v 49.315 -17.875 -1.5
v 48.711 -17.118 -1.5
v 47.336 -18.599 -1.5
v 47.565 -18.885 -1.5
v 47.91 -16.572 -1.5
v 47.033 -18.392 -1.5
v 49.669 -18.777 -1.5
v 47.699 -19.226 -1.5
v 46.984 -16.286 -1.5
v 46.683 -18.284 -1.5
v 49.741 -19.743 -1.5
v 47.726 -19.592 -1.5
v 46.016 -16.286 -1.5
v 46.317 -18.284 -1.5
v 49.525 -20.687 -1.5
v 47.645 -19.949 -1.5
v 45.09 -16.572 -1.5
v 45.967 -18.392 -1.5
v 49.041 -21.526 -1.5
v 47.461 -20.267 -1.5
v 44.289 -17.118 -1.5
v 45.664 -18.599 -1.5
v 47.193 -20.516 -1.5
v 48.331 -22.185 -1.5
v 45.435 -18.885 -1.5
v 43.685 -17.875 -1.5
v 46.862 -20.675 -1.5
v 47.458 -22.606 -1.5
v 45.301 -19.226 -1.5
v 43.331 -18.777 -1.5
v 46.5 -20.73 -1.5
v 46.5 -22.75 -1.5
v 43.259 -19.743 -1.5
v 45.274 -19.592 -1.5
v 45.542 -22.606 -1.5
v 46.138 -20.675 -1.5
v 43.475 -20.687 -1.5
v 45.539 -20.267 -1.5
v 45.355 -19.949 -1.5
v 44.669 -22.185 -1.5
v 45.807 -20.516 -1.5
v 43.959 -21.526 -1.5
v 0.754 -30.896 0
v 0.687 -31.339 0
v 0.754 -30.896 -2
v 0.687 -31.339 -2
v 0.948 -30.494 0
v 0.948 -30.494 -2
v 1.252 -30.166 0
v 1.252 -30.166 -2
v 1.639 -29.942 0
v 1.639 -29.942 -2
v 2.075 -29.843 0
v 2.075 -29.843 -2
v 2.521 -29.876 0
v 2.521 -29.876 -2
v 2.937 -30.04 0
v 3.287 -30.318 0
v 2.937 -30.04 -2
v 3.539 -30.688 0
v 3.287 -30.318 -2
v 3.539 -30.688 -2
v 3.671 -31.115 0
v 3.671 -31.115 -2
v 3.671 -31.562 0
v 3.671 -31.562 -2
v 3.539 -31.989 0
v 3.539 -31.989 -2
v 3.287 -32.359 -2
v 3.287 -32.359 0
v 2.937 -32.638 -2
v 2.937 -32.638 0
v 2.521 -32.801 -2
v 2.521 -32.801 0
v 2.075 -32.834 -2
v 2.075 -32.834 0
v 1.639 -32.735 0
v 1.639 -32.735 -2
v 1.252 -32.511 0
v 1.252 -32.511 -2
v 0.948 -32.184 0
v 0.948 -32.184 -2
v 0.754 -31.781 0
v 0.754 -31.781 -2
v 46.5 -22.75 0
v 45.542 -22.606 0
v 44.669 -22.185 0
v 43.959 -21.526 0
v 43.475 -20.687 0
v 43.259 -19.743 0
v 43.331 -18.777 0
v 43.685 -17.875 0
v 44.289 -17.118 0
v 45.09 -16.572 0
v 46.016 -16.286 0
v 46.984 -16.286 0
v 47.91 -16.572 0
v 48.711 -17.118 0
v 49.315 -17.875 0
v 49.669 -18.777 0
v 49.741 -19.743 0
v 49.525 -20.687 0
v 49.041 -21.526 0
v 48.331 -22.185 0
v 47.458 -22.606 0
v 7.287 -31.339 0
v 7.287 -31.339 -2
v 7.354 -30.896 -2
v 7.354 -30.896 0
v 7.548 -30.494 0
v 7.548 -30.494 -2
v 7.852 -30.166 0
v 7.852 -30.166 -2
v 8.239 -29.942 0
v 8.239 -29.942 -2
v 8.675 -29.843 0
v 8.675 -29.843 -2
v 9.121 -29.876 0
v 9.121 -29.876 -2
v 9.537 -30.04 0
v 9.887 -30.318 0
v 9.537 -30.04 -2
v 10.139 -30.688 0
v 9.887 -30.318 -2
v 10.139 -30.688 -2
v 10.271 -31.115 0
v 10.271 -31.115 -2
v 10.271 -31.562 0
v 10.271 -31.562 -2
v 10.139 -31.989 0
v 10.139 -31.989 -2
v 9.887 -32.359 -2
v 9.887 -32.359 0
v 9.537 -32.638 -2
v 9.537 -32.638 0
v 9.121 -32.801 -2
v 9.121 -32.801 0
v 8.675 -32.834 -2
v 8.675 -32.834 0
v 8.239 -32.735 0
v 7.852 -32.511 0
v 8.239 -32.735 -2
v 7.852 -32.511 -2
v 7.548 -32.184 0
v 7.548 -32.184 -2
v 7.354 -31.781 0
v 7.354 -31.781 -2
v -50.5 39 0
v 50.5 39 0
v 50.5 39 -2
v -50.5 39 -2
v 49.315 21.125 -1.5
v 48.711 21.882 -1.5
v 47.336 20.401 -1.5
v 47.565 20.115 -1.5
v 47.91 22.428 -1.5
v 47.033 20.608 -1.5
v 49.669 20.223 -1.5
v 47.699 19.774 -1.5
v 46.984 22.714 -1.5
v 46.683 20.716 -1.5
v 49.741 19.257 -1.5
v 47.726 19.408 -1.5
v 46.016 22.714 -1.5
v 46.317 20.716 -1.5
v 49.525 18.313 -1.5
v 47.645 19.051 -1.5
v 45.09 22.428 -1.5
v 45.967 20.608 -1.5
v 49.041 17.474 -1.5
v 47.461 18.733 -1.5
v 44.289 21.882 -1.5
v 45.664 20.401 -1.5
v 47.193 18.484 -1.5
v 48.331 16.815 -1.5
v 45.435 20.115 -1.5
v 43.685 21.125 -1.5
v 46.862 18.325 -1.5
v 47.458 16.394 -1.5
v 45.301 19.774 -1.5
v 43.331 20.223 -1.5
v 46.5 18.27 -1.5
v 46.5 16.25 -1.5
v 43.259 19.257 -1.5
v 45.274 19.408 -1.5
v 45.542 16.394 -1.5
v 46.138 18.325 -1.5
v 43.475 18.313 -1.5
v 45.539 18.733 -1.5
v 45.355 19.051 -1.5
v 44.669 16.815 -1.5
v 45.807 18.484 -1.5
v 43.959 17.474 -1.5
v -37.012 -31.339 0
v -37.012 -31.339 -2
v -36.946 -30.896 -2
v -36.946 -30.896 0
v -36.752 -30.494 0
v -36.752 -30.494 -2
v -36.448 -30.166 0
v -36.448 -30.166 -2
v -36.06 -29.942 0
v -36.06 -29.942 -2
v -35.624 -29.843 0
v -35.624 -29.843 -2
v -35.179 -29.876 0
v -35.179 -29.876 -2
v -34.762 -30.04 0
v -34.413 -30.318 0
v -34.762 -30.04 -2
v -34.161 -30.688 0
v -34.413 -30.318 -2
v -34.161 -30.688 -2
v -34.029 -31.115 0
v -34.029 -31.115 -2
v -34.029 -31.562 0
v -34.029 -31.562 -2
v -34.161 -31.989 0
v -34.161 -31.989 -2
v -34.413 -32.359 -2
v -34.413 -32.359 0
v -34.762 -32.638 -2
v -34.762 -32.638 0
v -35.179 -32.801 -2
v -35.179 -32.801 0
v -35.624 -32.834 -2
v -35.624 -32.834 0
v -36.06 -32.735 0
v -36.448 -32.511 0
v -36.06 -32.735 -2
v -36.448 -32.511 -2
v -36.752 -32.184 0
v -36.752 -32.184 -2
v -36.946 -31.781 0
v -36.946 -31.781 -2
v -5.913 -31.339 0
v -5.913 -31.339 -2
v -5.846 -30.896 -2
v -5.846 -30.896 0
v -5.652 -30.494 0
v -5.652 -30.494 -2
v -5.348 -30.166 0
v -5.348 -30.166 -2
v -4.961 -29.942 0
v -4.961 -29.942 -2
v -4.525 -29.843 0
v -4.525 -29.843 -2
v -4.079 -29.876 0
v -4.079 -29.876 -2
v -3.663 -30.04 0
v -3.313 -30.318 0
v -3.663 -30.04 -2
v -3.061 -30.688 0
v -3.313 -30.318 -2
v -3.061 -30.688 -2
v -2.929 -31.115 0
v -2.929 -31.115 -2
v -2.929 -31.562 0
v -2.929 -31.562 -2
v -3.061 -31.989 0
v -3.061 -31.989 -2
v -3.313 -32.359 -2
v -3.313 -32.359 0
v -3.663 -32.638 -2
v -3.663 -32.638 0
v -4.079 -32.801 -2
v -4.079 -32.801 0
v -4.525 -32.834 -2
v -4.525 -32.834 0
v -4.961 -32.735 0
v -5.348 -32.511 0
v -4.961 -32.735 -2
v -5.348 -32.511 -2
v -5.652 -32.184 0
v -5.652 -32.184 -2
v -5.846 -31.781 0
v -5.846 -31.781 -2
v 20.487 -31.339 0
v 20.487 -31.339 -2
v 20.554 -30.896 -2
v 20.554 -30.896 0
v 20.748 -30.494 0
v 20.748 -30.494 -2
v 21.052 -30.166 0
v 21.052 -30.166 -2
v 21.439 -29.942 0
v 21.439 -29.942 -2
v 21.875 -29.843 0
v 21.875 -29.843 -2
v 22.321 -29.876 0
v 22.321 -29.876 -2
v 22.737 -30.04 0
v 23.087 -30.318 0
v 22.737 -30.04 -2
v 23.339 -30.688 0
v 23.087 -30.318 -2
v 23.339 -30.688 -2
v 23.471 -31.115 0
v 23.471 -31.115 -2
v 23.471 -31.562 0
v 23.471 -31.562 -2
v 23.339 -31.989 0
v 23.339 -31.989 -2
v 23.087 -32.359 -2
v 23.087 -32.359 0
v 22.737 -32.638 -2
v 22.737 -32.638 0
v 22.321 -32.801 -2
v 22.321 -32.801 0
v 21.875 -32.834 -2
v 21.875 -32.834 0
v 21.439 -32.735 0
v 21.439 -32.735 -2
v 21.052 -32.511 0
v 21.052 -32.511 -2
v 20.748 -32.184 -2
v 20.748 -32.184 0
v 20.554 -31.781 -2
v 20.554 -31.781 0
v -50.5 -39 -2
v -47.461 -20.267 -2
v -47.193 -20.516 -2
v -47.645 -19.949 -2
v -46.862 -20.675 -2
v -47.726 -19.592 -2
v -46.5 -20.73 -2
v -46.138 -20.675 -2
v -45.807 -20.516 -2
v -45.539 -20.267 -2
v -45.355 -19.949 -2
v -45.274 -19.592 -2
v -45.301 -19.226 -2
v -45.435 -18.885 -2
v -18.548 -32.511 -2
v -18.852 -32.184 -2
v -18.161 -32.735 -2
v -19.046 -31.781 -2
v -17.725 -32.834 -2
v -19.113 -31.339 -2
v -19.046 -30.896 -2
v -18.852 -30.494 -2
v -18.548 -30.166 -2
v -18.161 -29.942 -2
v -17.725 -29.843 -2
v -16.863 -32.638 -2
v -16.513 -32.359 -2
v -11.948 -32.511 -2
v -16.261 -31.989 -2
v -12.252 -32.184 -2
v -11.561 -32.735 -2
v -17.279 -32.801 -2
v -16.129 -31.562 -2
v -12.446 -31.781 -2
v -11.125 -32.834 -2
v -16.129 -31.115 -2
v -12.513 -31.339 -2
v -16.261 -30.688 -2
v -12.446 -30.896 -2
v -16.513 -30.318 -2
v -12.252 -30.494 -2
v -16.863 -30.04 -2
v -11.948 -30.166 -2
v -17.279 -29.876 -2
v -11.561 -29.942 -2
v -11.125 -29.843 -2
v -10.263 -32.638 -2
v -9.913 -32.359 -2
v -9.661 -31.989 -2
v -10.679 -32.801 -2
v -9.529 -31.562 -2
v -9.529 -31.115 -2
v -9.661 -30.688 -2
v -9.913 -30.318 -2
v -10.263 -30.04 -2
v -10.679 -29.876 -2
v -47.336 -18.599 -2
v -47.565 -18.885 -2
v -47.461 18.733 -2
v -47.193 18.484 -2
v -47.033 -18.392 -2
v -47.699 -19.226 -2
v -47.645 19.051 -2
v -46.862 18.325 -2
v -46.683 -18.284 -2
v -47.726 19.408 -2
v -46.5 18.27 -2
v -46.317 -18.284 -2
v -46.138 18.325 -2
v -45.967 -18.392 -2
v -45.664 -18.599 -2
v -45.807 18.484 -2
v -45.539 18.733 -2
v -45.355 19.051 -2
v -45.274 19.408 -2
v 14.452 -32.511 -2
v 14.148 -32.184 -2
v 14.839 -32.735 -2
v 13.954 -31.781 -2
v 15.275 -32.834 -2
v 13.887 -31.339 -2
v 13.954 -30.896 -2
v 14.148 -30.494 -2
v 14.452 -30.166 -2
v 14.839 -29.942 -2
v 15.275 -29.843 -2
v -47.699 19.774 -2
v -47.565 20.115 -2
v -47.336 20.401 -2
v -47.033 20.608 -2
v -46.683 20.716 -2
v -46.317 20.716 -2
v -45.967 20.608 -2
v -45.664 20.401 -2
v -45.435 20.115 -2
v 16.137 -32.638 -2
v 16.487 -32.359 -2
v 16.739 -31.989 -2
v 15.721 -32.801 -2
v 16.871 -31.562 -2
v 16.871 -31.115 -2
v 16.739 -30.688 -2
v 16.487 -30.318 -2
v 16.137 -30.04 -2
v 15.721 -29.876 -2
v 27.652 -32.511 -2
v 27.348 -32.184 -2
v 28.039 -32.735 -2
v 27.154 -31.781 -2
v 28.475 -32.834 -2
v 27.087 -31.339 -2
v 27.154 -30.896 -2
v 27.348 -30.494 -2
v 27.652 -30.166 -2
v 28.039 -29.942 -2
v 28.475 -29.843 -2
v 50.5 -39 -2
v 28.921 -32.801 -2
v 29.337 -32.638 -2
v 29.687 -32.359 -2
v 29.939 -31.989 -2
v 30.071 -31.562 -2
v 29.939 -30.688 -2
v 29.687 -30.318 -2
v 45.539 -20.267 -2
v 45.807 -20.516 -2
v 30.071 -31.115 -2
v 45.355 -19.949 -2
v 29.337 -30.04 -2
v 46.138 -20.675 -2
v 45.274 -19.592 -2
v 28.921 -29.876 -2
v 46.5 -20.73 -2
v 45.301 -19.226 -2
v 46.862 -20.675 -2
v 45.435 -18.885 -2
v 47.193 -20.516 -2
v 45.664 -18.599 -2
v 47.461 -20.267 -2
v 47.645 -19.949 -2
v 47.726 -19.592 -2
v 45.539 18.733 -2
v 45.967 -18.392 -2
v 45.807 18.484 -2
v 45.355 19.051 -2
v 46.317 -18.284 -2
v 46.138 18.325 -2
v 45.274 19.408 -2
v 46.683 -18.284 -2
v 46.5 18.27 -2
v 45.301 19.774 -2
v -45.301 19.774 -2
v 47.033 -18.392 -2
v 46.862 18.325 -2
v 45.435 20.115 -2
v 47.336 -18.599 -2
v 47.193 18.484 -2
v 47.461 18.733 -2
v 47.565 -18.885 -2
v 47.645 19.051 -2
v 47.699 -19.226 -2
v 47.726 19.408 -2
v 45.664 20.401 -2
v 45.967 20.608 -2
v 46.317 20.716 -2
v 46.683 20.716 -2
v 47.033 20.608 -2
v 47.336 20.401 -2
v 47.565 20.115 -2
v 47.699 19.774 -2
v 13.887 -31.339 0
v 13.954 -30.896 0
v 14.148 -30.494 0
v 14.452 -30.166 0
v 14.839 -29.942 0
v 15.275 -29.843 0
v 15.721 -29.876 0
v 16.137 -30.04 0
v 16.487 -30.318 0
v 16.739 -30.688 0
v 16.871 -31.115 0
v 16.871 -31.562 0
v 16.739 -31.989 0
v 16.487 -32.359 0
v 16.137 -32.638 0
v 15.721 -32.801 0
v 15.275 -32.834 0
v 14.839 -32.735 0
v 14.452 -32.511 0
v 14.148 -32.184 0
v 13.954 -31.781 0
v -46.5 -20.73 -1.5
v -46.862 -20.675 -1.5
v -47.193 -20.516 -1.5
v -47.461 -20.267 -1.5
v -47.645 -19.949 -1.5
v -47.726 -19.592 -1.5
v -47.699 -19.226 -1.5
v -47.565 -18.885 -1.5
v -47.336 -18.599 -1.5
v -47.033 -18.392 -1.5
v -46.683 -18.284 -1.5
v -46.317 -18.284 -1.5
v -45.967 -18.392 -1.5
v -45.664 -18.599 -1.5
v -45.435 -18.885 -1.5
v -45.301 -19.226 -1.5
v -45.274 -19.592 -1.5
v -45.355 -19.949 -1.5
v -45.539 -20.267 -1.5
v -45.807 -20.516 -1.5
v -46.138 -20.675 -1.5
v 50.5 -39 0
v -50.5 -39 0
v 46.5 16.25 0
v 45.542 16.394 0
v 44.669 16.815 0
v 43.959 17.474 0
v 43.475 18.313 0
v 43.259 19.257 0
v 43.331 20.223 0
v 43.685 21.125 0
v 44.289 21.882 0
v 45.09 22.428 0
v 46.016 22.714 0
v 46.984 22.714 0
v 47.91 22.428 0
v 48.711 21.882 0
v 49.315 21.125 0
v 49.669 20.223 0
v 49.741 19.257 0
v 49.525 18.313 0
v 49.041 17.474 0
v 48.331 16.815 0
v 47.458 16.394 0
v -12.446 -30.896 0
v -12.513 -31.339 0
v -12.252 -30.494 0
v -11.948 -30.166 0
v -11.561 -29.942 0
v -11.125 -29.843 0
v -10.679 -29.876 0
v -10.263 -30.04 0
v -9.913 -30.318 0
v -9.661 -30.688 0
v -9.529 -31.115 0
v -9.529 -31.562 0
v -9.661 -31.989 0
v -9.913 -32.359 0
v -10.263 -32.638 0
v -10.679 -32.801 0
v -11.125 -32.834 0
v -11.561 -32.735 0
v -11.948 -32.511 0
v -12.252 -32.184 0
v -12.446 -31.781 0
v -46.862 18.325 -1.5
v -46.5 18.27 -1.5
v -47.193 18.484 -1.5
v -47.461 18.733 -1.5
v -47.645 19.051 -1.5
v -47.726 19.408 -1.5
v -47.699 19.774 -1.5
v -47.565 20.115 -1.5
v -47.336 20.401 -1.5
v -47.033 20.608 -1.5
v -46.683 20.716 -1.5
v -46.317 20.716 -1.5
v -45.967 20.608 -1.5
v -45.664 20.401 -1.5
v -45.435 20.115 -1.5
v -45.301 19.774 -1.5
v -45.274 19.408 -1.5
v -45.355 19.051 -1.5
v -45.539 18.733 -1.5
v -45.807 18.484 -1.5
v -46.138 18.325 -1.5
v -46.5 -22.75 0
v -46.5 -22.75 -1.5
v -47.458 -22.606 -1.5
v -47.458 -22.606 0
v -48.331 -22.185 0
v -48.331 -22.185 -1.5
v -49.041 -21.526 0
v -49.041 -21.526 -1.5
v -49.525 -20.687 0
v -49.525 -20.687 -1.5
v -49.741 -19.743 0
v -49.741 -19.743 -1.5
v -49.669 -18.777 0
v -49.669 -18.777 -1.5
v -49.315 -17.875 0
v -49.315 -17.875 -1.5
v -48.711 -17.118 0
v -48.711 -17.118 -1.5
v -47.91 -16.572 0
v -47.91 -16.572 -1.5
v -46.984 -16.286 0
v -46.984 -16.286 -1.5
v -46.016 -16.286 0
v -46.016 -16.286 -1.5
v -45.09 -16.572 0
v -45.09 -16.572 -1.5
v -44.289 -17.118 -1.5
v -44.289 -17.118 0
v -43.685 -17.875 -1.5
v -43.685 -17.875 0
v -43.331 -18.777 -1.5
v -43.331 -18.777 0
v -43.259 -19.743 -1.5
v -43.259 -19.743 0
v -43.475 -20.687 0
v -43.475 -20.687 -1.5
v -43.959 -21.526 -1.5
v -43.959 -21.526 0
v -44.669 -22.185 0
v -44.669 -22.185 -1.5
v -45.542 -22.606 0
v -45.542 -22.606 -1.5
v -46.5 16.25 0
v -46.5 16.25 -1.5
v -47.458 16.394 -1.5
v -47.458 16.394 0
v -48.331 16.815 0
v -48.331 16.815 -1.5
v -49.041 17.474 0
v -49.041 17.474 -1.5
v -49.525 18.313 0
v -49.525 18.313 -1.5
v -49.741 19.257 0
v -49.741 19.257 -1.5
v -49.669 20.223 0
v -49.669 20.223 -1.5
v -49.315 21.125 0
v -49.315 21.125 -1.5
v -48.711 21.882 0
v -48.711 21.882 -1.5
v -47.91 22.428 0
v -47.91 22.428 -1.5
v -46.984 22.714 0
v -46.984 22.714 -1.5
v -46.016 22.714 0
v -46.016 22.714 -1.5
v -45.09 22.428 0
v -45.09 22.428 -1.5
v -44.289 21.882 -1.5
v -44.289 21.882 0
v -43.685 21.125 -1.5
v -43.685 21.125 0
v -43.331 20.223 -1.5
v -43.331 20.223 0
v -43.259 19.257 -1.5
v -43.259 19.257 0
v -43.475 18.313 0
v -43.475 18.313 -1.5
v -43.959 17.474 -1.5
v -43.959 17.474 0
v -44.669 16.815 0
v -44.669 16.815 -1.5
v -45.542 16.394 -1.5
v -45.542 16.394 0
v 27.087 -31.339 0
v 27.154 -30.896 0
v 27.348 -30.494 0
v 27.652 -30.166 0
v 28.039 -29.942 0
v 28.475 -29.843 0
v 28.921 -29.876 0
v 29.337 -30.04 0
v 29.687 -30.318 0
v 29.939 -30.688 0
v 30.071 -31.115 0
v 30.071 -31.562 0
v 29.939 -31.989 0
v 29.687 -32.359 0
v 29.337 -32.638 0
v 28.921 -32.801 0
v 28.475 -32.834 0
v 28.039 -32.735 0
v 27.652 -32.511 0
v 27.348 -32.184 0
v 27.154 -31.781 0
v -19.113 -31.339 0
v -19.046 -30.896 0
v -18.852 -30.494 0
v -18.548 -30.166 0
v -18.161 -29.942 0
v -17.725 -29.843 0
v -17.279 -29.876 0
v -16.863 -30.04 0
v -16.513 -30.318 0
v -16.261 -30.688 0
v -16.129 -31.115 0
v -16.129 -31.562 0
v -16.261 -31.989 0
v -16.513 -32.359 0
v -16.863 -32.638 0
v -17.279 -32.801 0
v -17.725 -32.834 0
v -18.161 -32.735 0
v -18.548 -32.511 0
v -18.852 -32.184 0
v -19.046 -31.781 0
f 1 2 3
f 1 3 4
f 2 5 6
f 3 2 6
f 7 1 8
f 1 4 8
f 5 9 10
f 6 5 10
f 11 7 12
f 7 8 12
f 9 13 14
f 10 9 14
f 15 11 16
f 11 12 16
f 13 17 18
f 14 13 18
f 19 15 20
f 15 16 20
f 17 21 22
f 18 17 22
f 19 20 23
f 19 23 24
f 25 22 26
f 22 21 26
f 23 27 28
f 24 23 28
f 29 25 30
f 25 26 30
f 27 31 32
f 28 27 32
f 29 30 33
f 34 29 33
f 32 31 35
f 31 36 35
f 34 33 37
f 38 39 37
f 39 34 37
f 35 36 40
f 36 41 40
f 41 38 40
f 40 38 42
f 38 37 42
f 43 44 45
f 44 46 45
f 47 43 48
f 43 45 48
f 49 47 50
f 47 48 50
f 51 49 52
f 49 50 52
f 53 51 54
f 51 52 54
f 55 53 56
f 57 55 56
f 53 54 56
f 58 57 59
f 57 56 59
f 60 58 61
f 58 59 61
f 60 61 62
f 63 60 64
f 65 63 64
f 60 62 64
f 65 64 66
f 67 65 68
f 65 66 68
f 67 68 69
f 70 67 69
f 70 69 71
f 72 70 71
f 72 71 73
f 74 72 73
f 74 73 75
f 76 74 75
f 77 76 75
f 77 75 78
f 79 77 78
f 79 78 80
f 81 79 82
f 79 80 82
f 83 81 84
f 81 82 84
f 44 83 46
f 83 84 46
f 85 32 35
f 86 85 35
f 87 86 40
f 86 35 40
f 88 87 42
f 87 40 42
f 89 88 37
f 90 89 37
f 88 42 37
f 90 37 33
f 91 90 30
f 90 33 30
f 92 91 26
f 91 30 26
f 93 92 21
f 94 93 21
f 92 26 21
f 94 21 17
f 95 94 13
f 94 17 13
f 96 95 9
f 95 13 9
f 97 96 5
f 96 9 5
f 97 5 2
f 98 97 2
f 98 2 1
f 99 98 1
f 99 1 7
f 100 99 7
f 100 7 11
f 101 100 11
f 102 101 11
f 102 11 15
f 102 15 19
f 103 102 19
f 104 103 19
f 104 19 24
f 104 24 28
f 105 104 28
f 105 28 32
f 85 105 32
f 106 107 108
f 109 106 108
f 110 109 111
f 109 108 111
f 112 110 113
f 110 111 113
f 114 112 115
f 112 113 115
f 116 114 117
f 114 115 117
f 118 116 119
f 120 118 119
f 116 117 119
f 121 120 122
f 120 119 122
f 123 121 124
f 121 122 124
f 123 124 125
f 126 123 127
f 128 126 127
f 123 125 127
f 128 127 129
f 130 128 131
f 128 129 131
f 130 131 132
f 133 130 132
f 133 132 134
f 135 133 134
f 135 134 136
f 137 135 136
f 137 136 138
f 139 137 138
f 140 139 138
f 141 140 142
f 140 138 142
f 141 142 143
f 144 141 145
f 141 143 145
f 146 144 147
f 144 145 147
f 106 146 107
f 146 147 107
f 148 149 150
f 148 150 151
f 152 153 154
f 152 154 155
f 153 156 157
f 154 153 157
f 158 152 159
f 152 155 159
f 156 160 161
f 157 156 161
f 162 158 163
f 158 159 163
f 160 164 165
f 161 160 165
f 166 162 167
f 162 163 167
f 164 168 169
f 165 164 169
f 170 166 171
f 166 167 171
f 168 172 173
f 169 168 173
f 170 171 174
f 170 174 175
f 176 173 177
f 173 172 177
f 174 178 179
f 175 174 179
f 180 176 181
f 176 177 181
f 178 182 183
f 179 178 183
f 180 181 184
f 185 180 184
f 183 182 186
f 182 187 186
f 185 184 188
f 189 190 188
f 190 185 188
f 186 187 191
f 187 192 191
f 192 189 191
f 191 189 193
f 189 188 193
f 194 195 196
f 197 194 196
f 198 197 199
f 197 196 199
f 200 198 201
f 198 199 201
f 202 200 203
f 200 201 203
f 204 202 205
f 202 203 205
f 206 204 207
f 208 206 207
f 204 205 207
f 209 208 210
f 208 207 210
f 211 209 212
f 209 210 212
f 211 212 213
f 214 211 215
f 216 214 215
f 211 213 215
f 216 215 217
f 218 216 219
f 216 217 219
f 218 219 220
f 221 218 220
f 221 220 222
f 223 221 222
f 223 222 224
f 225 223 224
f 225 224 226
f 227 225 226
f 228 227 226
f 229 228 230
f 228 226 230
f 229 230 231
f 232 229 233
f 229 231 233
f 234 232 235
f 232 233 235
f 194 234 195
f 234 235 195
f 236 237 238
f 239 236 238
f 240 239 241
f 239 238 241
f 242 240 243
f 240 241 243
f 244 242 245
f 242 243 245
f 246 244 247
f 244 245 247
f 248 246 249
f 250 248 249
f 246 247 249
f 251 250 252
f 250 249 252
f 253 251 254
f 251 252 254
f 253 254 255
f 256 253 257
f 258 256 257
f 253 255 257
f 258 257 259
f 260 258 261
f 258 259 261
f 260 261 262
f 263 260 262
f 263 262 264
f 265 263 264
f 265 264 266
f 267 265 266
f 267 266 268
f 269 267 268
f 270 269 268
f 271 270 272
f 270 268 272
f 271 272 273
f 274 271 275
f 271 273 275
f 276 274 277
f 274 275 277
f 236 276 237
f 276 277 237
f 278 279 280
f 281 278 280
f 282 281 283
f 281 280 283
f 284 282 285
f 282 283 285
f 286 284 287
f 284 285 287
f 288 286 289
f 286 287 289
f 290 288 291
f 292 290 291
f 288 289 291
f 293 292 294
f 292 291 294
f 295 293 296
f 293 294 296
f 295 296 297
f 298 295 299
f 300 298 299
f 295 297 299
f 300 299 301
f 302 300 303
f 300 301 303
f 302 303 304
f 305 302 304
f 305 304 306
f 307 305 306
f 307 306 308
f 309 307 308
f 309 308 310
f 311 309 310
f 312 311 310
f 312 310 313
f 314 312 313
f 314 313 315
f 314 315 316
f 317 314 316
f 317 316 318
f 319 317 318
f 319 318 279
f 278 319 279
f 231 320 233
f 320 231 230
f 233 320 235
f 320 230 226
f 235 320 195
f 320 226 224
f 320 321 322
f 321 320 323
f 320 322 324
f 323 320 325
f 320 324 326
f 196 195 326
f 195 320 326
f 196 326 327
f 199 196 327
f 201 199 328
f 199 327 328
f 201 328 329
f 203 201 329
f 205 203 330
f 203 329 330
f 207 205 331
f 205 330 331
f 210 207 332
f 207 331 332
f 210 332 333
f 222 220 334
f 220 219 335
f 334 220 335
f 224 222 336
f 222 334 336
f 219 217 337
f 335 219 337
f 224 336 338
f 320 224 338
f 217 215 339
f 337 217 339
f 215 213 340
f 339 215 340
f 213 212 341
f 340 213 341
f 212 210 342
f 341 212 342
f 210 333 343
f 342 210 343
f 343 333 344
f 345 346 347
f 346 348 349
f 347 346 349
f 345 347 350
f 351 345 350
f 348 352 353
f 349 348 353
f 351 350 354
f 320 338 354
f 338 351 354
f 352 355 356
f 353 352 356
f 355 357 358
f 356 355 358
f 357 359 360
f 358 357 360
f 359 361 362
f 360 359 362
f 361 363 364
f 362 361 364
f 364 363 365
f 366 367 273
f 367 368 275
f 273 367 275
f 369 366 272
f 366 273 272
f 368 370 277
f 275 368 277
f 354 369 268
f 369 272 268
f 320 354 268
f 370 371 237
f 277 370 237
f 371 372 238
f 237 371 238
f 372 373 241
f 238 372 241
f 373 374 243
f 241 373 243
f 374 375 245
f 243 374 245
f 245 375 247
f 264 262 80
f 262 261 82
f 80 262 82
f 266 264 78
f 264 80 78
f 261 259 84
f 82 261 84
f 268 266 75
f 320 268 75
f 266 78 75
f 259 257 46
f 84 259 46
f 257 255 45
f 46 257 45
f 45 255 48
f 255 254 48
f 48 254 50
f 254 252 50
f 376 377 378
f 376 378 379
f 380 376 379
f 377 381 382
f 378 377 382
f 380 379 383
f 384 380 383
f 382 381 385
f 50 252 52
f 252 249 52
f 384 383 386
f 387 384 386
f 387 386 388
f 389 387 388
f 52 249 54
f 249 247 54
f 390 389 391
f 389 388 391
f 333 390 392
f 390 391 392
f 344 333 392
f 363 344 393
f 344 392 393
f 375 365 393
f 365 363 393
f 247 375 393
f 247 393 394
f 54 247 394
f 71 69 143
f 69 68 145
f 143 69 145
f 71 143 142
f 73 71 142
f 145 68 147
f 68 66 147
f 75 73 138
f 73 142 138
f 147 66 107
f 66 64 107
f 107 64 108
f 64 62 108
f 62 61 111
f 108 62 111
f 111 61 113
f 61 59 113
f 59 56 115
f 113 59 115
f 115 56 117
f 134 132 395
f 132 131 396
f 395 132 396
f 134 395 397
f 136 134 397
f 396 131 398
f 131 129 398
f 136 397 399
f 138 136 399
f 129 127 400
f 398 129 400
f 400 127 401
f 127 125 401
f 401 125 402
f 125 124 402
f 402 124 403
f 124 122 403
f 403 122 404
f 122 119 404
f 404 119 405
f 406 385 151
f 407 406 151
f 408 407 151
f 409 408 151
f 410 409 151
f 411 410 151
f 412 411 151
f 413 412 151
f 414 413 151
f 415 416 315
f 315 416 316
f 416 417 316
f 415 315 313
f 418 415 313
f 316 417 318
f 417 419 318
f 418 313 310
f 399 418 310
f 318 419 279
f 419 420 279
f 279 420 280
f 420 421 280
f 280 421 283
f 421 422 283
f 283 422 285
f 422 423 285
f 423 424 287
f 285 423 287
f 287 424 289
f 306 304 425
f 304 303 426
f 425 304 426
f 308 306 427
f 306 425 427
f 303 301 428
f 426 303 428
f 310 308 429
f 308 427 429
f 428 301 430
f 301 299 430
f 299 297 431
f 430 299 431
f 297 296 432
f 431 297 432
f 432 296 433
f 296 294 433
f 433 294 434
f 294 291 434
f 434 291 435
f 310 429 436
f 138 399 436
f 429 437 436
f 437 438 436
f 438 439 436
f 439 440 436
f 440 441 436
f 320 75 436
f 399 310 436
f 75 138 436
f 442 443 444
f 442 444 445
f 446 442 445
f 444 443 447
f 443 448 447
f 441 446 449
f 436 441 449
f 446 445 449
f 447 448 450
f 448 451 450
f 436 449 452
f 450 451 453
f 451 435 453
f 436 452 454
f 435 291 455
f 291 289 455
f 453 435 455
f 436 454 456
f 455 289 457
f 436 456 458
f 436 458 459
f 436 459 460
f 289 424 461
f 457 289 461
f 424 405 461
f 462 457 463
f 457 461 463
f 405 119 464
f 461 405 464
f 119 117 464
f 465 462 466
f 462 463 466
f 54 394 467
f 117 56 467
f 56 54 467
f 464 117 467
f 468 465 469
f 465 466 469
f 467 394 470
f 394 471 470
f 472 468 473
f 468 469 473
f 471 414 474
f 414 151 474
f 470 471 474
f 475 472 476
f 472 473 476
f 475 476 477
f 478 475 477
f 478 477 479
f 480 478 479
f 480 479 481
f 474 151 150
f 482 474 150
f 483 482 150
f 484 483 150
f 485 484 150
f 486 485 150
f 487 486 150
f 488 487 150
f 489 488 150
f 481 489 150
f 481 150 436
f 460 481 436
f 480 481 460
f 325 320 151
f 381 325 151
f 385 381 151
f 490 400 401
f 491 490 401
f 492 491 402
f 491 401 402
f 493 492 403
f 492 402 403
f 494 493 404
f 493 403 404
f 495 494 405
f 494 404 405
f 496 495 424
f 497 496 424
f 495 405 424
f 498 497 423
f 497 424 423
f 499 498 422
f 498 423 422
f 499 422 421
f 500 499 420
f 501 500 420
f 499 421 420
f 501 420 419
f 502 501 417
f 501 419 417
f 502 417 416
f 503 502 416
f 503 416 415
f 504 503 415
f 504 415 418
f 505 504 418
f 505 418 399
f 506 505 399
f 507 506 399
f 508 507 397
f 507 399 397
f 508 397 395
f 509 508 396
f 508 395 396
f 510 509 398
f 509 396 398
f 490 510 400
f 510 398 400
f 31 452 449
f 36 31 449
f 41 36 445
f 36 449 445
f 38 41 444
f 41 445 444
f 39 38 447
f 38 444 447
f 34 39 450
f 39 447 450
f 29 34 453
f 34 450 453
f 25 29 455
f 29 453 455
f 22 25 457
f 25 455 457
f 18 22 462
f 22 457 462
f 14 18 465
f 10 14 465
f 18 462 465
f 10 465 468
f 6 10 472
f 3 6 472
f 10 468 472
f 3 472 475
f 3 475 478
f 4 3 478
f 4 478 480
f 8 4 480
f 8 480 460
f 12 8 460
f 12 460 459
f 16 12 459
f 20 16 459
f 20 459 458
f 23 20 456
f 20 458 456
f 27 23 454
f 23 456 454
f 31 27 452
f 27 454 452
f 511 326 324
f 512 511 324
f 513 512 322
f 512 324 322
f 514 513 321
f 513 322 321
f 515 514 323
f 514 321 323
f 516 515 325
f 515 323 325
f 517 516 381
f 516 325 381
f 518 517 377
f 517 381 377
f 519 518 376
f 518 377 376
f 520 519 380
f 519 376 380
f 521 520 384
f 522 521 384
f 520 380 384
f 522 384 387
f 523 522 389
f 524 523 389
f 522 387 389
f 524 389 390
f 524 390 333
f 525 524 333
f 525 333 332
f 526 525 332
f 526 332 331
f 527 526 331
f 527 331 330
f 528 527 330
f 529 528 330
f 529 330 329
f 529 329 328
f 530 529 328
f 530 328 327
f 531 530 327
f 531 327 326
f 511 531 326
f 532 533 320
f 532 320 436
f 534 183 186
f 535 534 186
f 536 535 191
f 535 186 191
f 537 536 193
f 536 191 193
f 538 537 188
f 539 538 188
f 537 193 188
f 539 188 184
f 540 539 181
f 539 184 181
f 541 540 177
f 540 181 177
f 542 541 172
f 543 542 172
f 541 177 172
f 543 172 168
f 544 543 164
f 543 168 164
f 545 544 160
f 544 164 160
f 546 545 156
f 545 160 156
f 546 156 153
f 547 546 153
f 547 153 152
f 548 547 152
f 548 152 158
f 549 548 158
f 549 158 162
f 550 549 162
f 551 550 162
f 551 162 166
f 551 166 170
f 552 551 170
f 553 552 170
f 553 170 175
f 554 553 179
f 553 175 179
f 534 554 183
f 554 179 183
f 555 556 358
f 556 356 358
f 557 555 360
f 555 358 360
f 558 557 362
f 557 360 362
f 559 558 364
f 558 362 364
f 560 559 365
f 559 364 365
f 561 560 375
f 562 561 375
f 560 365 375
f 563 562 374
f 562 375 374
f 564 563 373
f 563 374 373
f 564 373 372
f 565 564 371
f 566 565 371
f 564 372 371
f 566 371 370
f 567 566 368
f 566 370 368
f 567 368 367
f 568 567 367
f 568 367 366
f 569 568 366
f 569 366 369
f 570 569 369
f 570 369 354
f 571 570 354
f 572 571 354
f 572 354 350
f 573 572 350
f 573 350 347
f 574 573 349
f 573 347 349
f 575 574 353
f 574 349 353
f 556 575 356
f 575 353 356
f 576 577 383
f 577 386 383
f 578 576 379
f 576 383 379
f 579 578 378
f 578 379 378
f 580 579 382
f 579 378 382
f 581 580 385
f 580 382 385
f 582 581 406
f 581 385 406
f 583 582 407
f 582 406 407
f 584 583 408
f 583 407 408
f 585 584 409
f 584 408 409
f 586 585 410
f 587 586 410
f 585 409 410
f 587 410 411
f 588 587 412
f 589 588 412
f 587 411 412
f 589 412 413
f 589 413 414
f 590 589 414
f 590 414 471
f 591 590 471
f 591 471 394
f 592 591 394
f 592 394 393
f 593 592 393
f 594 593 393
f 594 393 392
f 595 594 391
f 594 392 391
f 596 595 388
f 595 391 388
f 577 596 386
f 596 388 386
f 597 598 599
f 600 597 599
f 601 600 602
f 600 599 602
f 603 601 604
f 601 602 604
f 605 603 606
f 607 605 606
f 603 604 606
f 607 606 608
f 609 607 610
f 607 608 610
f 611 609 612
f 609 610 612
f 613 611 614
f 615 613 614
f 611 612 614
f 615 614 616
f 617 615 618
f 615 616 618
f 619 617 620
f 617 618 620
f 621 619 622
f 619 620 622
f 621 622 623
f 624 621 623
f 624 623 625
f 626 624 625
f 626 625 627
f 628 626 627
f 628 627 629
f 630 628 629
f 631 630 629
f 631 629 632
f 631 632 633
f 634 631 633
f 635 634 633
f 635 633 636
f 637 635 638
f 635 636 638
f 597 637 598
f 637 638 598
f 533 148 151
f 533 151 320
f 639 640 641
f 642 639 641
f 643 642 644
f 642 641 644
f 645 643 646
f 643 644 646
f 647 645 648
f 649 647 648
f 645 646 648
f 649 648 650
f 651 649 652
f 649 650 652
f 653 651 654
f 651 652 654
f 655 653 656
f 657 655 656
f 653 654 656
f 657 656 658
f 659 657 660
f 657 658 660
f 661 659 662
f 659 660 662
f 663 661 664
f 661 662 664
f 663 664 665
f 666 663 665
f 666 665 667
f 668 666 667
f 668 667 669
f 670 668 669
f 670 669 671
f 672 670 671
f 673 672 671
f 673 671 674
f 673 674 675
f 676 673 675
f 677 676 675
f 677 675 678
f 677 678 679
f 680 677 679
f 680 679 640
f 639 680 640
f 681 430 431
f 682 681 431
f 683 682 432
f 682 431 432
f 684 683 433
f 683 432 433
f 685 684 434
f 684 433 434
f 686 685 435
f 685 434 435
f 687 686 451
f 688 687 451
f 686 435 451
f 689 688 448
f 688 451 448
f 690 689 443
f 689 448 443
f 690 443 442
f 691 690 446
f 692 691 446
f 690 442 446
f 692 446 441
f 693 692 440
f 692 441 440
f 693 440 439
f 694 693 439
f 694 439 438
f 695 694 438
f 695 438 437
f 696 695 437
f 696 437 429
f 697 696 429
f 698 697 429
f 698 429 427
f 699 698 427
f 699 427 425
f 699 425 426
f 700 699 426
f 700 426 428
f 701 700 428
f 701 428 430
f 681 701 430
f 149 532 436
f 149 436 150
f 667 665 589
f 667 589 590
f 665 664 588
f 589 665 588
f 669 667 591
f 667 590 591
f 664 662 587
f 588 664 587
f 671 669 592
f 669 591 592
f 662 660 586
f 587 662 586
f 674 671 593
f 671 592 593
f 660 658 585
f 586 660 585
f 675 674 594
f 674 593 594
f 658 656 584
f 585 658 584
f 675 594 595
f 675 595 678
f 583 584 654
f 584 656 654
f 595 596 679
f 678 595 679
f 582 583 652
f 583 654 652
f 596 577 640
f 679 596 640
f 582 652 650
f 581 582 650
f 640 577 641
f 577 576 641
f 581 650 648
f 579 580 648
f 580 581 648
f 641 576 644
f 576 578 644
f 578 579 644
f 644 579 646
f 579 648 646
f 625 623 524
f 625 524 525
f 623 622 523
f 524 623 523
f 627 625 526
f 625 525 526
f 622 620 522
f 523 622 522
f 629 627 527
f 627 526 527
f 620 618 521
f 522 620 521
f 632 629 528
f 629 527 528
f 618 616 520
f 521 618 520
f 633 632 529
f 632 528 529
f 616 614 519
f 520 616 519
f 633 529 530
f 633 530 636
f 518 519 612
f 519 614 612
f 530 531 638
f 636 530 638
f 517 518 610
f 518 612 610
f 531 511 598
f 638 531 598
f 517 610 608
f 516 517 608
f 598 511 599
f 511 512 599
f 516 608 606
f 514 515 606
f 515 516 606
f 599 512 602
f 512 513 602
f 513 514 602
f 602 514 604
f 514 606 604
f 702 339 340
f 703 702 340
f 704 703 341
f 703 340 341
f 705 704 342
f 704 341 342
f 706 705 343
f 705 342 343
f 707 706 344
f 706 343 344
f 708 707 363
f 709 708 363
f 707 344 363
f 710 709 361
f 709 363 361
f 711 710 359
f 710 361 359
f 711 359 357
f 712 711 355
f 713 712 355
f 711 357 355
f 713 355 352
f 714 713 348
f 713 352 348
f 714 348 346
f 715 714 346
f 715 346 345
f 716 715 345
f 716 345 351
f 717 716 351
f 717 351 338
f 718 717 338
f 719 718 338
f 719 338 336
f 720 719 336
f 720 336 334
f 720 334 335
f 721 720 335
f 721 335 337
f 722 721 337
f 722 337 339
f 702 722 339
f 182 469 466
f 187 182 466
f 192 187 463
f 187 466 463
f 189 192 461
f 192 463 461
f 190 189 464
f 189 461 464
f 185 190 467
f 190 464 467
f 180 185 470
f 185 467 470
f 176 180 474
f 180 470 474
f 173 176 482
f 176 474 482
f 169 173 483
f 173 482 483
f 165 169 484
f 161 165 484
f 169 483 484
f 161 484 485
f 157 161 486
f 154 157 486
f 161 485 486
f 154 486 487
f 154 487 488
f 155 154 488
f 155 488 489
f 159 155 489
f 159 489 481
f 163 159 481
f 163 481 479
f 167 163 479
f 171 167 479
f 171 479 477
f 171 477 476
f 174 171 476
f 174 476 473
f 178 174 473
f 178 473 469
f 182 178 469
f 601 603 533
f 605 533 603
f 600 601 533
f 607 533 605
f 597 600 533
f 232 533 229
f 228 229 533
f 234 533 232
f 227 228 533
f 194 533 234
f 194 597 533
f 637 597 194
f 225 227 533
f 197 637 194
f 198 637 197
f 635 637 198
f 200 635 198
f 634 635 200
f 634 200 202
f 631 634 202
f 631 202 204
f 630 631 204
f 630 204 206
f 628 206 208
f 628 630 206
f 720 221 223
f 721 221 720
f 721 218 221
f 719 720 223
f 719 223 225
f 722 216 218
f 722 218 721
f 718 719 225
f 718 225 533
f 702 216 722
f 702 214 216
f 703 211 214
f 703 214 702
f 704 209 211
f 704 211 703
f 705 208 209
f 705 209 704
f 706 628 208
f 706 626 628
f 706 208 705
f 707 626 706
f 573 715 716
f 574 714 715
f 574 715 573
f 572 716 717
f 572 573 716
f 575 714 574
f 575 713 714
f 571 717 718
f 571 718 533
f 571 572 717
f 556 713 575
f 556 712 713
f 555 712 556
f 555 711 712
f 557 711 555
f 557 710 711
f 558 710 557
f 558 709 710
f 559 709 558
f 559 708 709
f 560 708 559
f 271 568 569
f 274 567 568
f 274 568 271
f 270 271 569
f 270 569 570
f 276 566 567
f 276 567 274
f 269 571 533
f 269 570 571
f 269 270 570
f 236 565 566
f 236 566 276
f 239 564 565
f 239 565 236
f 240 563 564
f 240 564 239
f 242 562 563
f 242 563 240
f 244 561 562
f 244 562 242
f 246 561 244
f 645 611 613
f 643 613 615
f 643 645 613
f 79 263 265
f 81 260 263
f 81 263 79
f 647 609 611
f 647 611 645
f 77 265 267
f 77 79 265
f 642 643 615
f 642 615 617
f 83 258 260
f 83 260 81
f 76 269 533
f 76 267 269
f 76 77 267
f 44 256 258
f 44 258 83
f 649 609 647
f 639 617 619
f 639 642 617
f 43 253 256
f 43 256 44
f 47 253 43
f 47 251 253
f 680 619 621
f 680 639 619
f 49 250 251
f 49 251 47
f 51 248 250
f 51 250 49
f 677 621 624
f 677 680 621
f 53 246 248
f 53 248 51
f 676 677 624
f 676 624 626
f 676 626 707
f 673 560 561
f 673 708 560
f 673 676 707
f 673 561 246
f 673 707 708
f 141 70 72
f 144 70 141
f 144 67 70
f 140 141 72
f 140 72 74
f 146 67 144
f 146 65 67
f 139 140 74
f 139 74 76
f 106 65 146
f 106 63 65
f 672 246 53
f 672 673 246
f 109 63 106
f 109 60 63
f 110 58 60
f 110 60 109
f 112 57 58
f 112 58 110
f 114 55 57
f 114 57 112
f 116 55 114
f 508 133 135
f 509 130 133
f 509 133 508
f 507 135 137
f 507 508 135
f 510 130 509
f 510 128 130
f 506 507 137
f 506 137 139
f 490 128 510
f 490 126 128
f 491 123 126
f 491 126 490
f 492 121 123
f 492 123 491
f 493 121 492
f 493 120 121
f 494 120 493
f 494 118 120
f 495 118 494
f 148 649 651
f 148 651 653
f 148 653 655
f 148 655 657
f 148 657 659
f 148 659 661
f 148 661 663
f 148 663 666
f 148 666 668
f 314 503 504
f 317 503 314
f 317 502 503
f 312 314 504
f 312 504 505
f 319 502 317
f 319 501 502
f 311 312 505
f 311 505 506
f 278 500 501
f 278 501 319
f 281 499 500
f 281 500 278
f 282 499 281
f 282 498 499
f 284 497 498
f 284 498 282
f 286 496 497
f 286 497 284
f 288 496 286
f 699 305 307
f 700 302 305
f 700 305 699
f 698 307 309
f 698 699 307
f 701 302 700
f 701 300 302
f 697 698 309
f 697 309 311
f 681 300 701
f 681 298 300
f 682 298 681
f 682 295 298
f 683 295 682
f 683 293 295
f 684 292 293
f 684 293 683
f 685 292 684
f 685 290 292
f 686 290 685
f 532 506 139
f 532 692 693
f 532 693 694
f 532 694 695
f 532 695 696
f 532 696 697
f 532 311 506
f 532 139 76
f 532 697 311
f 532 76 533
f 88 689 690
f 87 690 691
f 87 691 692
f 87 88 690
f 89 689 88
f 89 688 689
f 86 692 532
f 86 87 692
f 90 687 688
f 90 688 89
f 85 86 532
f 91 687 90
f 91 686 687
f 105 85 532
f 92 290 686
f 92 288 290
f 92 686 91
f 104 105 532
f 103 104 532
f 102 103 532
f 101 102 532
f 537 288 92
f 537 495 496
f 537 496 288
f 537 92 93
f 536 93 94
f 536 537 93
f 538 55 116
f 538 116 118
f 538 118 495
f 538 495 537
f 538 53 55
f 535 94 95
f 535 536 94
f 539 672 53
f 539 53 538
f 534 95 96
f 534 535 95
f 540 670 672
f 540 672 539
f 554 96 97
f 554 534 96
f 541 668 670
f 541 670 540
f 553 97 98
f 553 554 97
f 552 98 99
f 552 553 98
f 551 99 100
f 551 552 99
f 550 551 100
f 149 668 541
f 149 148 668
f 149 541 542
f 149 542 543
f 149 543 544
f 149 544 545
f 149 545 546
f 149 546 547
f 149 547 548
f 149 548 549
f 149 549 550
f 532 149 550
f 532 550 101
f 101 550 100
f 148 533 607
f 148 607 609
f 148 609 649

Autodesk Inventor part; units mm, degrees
ref_plane "YZ Plane" through (0, 0, 0) normal (1, 0, 0) x (0, 1, 0)
ref_plane "XZ Plane" through (0, 0, 0) normal (0, 1, 0) x (-1, 0, 0)
ref_plane "XY Plane" through (0, 0, 0) normal (0, 0, 1) x (1, 0, 0)
sketch "Esboço1" plane through (0, 0, 0) normal (0, 0, 1) x (1, 0, 0)
  line L0 (-50.5, -39) -> (50.5, -39)
  line L1 (50.5, -39) -> (50.5, 39)
  line L2 (50.5, 39) -> (-50.5, 39)
  line L3 (-50.5, 39) -> (-50.5, -39)
  point P0 (0, 0)
  dimension "d2" = 101
  dimension "d3" = 78
  dimension "d4" = 101
  dimension "d5" = 50.5
  dimension "d6" = 39
extrude "Extrusão1" add sketch "Esboço1" against normal blind 2
sketch "Esboço2" plane through (0, 0, 0) normal (0, 0, 1) x (1, 0, 0)
  line L0 (-50.5, -39) -> (-50.5, 39) projected
  line L1 (-42.5, -39) -> (-42.5, 39) construction
  line L2 (42.5, -39) -> (42.5, 39) construction
  line L3 (-46.5, 39) -> (-46.5, -39) construction
  line L4 (-50.5, 39) -> (50.5, 39) projected
  line L5 (46.5, 39) -> (46.5, -39) construction
  line L6 (50.5, 39) -> (50.5, -39) projected
  line L7 (-50.5, -19.5) -> (50.5, -19.5) construction
  line L8 (-50.5, 19.5) -> (50.5, 19.5) construction
  point P0 (0, 0)
  point P1 (-46.5, 19.5)
  point P2 (-46.5, -19.5)
  point P3 (46.5, -19.5)
  point P4 (46.5, 19.5)
hole "Furo1" at (-46.5, 19.5, 0) at (-46.5, -19.5, 0) at (46.5, -19.5, 0) at (46.5, 19.5, 0) direction (0, 0, -1) diameter 2.459 end through all counterbore diameter 6.5 counterbore depth 1.5 thread size "M3x0.5" class "6H" standard "ANSI Metric M Profile"
sketch "Esboço3" plane through (0, 0, -2) normal (0, 0, -1) x (-1, 0, 0)
  line L0 (39.7375, -31.6586) -> (-39.7375, -31.6586) projected
  line L1 (-29.1874, -30.9886) -> (-27.9874, -30.9886) projected
  line L2 (-27.9874, -30.9886) -> (-27.9374, -31.5336) projected
  line L3 (-29.1874, -30.9886) -> (-29.2374, -31.5336) projected
  line L4 (-22.5874, -30.9886) -> (-21.3874, -30.9886) projected
  line L5 (-22.5874, -30.9886) -> (-22.6374, -31.5336) projected
  line L6 (-21.3874, -30.9886) -> (-21.3374, -31.5336) projected
  line L7 (-21.3874, -30.9886) -> (-21.3874, -30.9886) projected
  line L8 (-15.9874, -30.9886) -> (-14.7874, -30.9886) projected
  line L9 (-15.9874, -30.9886) -> (-16.0374, -31.5336) projected
  line L10 (-14.7874, -30.9886) -> (-14.7374, -31.5336) projected
  line L11 (-9.3874, -30.9886) -> (-8.1874, -30.9886) projected
  line L12 (-8.1874, -30.9886) -> (-8.1374, -31.5336) projected
  line L13 (-9.3874, -30.9886) -> (-9.4374, -31.5336) projected
  line L14 (-2.7874, -30.9886) -> (-1.5874, -30.9886) projected
  line L15 (-2.7874, -30.9886) -> (-2.8374, -31.5336) projected
  line L16 (-1.5874, -30.9886) -> (-1.5374, -31.5336) projected
  line L17 (3.8127, -30.9886) -> (5.0127, -30.9886) projected
  line L18 (5.0127, -30.9886) -> (5.0627, -31.5336) projected
  line L19 (3.8127, -30.9886) -> (3.7627, -31.5336) projected
  line L20 (10.4126, -30.9886) -> (11.6126, -30.9886) projected
  line L21 (10.4126, -30.9886) -> (10.4126, -30.9886) projected
  line L22 (10.4126, -30.9886) -> (10.3626, -31.5336) projected
  line L23 (11.6126, -30.9886) -> (11.6626, -31.5336) projected
  line L24 (17.0126, -30.9886) -> (18.2126, -30.9886) projected
  line L25 (17.0126, -30.9886) -> (16.9626, -31.5336) projected
  line L26 (18.2126, -30.9886) -> (18.2626, -31.5336) projected
  line L27 (35.0474, -31.0186) -> (35.9774, -31.0186) projected
  line L28 (36.3874, -31.6586) -> (36.3874, -31.0186) projected
  line L29 (34.6374, -31.6586) -> (34.6374, -31.0186) projected
  line L30 (35.0474, -31.0186) -> (34.6374, -31.0186) projected
  line L31 (36.3874, -31.0186) -> (35.9774, -31.0186) projected
  line L32 (-28.5874, -31.3386) -> (36.3874, -31.3386) construction
  circle A0 centre (35.5124, -31.3386) radius 1.5
  circle A1 centre (-28.5874, -31.3386) radius 1.5
  circle A2 centre (17.6126, -31.3386) radius 1.5
  circle A3 centre (11.0126, -31.3386) radius 1.5
  circle A4 centre (4.4127, -31.3386) radius 1.5
  circle A5 centre (-2.1874, -31.3386) radius 1.5
  circle A6 centre (-8.7874, -31.3386) radius 1.5
  circle A7 centre (-15.3874, -31.3386) radius 1.5
  circle A8 centre (-21.9874, -31.3386) radius 1.5
  point P0 (0, 0)
  dimension "d23" = 3
  dimension "d24" = 3
  dimension "d25" = 3
  dimension "d26" = 3
  dimension "d27" = 3
  dimension "d28" = 3
  dimension "d29" = 3
  dimension "d30" = 3
  dimension "d31" = 3
  dimension "d32" = 0.32
  dimension "d33" = 0.875
  dimension "d34" = 18.7748
  dimension "d35" = 25.3748
  dimension "d36" = 31.9748
  dimension "d37" = 38.5748
  dimension "d38" = 45.1748
  dimension "d39" = 51.7748
  dimension "d40" = 58.3748
  dimension "d41" = 64.9748
extrude "Extrusão2" cut sketch "Esboço3" against normal blind 10
properties part number "Ra-Manager_Painel-Placas_Relays" material "Aço, carbono"
